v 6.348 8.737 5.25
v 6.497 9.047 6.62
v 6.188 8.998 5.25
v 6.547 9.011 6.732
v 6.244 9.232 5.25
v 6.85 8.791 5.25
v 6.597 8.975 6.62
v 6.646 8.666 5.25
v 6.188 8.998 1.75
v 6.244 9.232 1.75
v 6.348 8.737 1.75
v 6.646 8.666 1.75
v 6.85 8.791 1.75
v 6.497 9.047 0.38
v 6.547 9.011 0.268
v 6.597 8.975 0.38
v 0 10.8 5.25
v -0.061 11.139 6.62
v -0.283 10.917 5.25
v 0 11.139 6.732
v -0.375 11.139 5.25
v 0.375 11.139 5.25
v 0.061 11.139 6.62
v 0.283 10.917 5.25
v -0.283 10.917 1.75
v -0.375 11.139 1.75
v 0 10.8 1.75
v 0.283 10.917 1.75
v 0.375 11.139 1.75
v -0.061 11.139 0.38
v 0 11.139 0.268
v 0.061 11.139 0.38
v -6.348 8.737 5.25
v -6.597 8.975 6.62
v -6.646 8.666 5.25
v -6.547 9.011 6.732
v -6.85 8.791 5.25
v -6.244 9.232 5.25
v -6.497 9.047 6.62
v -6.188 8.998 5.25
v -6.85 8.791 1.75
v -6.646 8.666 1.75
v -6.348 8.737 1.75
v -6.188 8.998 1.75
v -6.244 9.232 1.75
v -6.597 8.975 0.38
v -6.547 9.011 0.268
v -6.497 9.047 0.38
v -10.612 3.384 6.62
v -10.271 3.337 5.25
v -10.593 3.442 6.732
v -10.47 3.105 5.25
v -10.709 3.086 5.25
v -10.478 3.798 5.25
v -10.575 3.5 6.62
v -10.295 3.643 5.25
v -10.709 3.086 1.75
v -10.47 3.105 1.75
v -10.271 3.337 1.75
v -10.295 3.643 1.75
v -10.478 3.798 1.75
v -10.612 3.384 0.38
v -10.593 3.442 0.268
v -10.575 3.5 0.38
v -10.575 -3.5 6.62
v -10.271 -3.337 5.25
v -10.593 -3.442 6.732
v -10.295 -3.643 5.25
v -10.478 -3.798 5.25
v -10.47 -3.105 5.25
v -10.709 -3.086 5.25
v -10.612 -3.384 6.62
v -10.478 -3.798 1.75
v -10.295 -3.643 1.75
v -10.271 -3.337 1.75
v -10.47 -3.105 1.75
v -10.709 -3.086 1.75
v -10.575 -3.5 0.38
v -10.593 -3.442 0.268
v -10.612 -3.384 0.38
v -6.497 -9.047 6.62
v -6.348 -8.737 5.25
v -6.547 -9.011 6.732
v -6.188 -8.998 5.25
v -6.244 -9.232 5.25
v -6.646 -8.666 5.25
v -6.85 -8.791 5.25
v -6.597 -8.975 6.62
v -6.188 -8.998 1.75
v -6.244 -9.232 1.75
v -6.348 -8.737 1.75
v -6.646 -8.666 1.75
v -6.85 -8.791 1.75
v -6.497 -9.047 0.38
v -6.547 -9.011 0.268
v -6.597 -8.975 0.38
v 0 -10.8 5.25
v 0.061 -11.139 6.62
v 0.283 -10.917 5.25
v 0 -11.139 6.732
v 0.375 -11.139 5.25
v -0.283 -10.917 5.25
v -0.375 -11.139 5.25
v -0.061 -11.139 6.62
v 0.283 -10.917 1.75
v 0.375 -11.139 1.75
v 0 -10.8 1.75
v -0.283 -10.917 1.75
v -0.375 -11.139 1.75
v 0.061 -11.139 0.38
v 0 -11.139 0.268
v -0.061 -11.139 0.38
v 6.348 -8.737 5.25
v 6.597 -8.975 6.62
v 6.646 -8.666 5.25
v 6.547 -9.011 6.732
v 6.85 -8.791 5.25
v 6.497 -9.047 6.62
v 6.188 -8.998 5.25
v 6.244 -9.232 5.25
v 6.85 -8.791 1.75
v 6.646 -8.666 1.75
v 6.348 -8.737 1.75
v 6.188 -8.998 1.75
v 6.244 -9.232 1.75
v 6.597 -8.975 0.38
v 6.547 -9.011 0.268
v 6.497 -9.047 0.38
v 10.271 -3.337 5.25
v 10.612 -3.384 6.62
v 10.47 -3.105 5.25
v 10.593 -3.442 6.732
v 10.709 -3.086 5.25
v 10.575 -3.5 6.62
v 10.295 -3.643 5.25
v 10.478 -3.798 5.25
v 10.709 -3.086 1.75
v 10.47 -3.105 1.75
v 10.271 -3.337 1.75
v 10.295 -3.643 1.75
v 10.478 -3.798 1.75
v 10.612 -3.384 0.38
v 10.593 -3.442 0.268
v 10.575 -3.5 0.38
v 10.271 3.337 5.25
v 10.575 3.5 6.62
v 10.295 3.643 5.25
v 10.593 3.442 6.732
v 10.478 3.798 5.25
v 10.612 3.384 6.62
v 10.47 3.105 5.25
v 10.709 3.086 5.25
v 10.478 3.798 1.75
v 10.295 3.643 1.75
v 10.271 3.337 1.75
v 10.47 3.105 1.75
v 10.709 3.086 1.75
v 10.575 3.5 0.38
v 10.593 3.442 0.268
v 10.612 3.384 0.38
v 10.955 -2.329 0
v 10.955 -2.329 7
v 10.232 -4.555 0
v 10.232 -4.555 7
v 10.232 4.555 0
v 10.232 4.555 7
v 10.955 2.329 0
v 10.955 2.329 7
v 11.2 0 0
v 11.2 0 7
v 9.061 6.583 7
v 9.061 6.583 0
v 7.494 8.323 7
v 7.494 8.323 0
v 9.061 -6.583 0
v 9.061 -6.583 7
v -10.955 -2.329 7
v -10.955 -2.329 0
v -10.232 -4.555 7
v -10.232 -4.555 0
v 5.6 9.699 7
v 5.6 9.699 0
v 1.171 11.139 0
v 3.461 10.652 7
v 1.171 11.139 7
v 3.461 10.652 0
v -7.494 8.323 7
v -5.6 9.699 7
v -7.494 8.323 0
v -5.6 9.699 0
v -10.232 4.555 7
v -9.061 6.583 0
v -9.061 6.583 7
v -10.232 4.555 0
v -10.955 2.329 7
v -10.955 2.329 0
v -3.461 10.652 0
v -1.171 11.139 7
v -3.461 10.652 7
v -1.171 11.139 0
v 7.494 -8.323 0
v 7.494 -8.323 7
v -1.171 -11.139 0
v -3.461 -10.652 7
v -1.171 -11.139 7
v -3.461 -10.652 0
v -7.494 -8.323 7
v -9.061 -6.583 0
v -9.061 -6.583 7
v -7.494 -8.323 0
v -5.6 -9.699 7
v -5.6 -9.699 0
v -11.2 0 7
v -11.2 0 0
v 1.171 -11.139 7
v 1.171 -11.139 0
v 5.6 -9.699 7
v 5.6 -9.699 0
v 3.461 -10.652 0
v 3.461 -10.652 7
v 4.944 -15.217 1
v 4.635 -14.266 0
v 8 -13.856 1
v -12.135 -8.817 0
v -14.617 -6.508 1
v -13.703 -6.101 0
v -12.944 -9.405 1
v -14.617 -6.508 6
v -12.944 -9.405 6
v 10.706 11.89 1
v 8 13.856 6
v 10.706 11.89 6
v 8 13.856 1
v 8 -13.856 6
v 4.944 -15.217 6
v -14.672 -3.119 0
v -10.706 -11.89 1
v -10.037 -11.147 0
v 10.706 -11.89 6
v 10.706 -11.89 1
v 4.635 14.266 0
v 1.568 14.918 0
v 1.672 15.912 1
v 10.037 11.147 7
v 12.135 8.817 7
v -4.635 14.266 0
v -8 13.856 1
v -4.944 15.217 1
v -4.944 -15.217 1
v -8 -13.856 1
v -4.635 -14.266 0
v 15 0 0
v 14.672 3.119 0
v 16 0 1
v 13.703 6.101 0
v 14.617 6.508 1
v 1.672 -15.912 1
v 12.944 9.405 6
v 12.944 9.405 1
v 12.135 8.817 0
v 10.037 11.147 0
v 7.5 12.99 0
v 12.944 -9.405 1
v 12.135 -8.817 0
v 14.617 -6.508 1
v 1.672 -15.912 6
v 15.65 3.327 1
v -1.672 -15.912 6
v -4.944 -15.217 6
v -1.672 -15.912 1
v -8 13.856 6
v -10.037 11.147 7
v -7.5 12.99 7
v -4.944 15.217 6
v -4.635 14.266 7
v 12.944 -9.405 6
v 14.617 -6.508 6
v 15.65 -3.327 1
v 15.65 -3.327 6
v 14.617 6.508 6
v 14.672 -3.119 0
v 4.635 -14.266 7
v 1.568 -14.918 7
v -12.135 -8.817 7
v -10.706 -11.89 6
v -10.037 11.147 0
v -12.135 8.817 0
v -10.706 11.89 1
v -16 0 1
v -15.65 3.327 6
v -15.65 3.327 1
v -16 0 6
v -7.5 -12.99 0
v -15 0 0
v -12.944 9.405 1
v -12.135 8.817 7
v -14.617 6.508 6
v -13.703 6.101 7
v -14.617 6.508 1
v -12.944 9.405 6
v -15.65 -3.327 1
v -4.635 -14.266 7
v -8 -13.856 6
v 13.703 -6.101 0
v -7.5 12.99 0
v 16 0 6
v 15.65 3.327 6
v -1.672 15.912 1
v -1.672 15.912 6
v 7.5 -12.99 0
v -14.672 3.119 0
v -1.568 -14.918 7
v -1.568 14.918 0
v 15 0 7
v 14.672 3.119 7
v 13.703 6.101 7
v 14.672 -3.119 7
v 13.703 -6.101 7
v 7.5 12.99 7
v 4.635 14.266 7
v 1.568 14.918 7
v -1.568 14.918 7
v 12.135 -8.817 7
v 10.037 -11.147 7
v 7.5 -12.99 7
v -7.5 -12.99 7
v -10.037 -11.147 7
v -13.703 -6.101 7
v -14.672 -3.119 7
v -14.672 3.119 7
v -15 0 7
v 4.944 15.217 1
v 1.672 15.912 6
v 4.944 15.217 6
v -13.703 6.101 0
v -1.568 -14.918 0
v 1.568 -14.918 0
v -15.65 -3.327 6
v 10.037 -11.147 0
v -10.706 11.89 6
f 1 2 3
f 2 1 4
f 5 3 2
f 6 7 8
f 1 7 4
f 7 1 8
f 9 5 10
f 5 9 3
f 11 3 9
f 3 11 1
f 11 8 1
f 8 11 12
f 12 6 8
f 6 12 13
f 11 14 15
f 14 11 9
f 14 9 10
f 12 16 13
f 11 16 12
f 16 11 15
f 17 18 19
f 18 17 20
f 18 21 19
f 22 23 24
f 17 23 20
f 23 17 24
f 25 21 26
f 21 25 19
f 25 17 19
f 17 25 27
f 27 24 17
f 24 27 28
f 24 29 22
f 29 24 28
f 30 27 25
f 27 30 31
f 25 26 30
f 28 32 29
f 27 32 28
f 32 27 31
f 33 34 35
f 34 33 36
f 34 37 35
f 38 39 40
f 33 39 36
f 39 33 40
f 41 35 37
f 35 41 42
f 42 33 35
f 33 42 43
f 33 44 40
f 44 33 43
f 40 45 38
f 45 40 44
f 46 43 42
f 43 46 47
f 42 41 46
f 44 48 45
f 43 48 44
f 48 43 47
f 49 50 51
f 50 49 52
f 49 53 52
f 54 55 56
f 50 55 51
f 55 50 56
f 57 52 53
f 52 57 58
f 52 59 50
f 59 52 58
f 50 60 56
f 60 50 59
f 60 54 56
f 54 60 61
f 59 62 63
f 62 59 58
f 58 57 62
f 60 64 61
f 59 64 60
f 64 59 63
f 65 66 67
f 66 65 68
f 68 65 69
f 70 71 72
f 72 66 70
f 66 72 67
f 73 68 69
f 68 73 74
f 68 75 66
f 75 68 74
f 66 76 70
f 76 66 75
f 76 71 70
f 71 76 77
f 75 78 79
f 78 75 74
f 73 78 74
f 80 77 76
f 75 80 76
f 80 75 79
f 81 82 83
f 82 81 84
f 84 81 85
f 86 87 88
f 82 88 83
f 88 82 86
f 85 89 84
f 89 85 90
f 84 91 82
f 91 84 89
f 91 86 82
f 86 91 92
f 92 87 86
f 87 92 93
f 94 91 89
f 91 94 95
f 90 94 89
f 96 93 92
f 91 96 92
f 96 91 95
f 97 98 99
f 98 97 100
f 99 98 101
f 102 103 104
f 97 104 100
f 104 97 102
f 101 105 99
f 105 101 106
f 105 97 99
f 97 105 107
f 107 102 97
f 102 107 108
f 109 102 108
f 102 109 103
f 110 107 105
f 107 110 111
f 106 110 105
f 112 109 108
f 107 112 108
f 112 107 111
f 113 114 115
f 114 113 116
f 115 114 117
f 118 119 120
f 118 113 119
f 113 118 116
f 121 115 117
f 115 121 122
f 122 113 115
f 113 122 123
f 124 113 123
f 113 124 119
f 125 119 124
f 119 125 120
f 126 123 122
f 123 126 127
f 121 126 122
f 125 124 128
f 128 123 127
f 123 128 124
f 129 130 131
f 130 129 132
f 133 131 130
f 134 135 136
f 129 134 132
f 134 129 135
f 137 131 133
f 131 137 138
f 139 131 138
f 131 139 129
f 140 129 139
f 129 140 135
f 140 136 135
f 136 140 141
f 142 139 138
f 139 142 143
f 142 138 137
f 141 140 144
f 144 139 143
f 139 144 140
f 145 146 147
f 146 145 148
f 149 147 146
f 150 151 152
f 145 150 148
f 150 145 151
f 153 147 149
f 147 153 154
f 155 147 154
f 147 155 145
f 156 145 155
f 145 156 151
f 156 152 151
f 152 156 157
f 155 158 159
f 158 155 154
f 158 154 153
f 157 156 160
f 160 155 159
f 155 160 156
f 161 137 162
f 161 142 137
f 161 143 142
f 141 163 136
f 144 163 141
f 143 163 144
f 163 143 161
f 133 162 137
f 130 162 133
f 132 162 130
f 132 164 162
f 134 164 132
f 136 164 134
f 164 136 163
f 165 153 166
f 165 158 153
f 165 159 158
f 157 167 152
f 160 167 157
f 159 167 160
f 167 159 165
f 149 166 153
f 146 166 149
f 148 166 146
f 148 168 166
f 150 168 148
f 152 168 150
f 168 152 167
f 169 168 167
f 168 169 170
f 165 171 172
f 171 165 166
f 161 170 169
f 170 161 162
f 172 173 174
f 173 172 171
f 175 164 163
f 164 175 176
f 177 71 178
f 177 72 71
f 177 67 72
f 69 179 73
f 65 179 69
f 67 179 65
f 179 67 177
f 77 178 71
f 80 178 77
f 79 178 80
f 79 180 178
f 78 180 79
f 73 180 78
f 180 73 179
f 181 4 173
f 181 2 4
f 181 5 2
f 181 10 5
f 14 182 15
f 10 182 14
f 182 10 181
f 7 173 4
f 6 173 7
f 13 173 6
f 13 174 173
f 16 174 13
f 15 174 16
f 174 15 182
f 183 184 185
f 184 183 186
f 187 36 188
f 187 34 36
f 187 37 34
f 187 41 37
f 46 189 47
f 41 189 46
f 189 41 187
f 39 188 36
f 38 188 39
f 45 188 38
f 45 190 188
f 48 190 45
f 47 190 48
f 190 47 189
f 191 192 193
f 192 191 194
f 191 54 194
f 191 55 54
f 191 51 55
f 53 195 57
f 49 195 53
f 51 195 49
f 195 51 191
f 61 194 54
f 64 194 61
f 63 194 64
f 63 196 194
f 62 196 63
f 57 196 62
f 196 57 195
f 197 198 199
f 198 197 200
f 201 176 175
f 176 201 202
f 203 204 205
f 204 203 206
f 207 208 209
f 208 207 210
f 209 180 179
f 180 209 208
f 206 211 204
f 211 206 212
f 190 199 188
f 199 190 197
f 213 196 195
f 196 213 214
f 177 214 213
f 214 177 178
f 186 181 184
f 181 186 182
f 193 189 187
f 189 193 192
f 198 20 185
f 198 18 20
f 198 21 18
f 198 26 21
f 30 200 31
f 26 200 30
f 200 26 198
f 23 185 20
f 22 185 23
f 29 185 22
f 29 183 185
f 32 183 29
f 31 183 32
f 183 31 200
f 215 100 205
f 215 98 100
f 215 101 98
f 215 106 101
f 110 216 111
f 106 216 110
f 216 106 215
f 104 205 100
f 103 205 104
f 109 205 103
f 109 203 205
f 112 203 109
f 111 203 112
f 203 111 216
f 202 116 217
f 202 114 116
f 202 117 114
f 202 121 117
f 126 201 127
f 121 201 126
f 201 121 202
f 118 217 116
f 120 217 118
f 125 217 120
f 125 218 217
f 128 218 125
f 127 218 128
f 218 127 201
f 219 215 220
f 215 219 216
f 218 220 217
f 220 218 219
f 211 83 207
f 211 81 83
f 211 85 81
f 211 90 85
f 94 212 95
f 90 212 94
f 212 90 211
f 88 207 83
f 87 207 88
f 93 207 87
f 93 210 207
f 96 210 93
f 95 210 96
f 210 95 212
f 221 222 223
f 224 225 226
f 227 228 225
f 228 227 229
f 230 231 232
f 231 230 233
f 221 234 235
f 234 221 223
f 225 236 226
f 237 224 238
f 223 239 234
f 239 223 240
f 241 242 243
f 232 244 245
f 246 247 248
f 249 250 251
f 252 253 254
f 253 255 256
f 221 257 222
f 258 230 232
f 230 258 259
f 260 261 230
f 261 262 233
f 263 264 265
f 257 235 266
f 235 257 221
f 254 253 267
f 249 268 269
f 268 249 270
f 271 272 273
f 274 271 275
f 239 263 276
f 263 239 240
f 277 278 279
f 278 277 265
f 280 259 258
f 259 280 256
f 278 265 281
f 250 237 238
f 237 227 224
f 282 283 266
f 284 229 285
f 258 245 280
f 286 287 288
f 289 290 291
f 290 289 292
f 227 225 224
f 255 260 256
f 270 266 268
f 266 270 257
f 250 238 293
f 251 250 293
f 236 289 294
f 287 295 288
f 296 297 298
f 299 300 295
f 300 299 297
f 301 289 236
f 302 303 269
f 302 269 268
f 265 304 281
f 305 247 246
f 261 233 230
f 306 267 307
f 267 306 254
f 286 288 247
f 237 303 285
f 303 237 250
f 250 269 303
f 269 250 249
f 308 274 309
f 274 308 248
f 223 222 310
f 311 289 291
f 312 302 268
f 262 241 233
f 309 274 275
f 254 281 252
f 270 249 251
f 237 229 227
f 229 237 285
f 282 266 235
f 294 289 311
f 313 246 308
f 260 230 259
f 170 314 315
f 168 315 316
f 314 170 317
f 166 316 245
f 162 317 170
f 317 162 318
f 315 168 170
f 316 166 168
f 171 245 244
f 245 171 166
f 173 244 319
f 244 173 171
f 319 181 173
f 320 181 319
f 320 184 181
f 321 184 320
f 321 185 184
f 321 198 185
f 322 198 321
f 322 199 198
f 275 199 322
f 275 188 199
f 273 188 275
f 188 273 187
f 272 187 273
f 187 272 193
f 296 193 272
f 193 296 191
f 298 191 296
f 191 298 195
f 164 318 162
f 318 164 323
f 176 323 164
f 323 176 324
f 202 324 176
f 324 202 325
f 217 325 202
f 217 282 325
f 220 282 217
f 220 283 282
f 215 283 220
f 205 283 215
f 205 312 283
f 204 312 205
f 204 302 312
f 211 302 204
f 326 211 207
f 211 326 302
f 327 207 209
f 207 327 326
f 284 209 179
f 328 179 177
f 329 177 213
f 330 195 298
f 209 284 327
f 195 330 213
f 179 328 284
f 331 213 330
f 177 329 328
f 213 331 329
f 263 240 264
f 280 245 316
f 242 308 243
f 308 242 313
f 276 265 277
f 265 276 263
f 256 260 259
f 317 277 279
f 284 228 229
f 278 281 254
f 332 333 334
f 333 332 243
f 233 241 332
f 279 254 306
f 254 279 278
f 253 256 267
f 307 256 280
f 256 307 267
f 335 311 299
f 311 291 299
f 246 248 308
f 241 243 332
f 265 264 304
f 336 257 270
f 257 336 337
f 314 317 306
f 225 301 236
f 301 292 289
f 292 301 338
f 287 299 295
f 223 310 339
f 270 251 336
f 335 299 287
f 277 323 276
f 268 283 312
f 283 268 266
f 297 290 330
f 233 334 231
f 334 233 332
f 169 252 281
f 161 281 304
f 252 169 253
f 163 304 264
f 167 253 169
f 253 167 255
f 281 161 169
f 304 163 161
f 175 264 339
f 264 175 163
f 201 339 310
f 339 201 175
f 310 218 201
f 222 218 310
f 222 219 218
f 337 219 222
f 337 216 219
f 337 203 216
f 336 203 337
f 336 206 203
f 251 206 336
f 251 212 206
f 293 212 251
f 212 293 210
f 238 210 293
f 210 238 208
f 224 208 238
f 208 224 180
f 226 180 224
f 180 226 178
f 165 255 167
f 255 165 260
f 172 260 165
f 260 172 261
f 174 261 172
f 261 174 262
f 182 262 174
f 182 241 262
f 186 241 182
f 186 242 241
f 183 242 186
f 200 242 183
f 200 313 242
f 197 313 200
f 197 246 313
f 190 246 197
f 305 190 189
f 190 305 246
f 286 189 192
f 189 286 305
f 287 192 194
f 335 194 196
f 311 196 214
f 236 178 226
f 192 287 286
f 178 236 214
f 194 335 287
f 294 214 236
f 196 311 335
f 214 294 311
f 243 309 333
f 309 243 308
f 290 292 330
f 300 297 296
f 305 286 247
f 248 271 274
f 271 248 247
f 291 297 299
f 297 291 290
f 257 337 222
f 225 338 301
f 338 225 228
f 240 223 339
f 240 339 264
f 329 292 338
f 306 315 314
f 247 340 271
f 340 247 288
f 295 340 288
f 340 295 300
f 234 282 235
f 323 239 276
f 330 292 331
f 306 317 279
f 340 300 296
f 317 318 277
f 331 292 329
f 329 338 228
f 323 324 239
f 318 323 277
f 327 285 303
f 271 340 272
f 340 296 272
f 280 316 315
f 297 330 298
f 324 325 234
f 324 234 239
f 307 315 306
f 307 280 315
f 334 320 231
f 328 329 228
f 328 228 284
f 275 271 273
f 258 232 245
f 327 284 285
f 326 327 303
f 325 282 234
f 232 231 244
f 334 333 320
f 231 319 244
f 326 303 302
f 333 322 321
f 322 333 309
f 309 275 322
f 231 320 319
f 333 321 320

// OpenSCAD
// file: shapes/torus.scad
torus();

module torus(
    h = 2,     
    r = 10,   
    sides = $fn)
{
    tube_radius = h / 2;
    inside_radius = r - tube_radius;
    //translate([r,r,thickness_radius])
    translate([0,0,tube_radius])
    rotate_extrude()
    translate([inside_radius, 0, 0])
    circle(r = tube_radius, $fn = sides);
}
// file: shapes/bearing.table.scad
function bearing_outer_diameter(index) = bearing_data(index)[0];
function bearing_inner_diameter(index) = bearing_data(index)[1];
function bearing_height(index) = bearing_data(index)[2];
function bearing_ball_qty(index) = bearing_data(index)[3];

function bearing_data(index) = 
    // od, id, h, ball_qty
    index == "608"  ? [22, 8, 7, 7] :
    "Error";
// file: shapes/bearing_race_hole.settings.scad
default_clearance = 0.2;
default_spline_qty = 10;
default_spline_depth = 0.4;
default_extra_margin_top = 10;
default_extra_margin_bottom = 10;
// file: shapes/bearing_race_spline.scad
bearing_race_spline();

module bearing_race_spline(
    h = 10, 
    r = 1,
    taper = 2.5)
{
    cylinder_height = h - (taper * 2);
    
    translate([0,0,taper + cylinder_height])
    cylinder(h = taper, r1 = r, r2 = 0);
    
    translate([0,0,taper])
    cylinder(h = cylinder_height, r = r);
    
    cylinder(h = taper, r1 = 0, r2 = r);
}
// file: shapes/chamfer_cylinder.scad
use <torus.scad>;

default_chamfer_radius = 1;

chamfer_cylinder();

module chamfer_cylinder(
    h = 10, 
    r = undef,
    d = 10,
    chamfer_radius = undef)
{
    function _chamfer_radius() = (chamfer_radius != undef) ? chamfer_radius : default_chamfer_radius;
    
    function _r() = 
        (r) ? r : 
        (d) ? d / 2 :
        "error";

    hull()
    {
        r = _r();
        chamfer_radius = _chamfer_radius();

        // top chamfer
        translate([0, 0, h-chamfer_radius])
        cylinder(
            h = chamfer_radius, 
            r1 = r,
            r2 = r - chamfer_radius);
        
        // bottom chamfer
        cylinder(
            h = chamfer_radius, 
            r1 = r - chamfer_radius,
            r2 = r);
    }    
}
// file: shapes/bearing_race_hole.scad
use <bearing_race_spline.scad>;
include <bearing_race_hole.settings.scad>;
include <bearing.table.scad>;

bearing_race_hole();

module bearing_race_hole(
    index = "608",
    clearance = undef,
    h = undef,
    spline_qty = undef,
    spline_depth = undef,
    extra_margin_bottom = undef,
    extra_margin_top = undef)
{
    function _clearance() = (clearance != undef) ? clearance : default_clearance;
    function _h() = (h != undef) ? h : bearing_height(index);
    function _spline_qty() = (spline_qty != undef) ? spline_qty : default_spline_qty;
    function _spline_depth() = (spline_depth != undef) ? spline_depth : default_spline_depth;
    function _extra_margin_bottom() = (extra_margin_bottom != undef) ? extra_margin_bottom : default_extra_margin_bottom;
    function _extra_margin_top() = (extra_margin_top != undef) ? extra_margin_top : default_extra_margin_top;

    r = (bearing_outer_diameter(index) / 2) + _clearance();

    difference()
    {
        extra_margin_bottom = _extra_margin_bottom();
        extra_margin_top = _extra_margin_top();
        spline_qty = _spline_qty();
        h = _h() + extra_margin_bottom + extra_margin_top;

        translate([0, 0, -extra_margin_bottom])
        cylinder(h = h, r = r);
        
        rotate([0, 0, 360 / spline_qty / 2])
        splines();
    }
    
    module splines()
    {
        h = _h();
        spline_qty = _spline_qty();
        spline_depth = _spline_depth();

        for (i = [1:spline_qty])
        {
            angle = i * (360 / spline_qty);
            rotate([0, 0, angle])
            translate([r, 0, 0])
            bearing_race_spline(
                h = h, 
                r = spline_depth, 
                taper = h / 4, 
                $fn = 8);
        }        
    }
}
// main file
use <shapes/bearing_race_hole.scad>;
use <shapes/chamfer_cylinder.scad>;

build_bearing_fit_test();

module build_bearing_fit_test(
    index = "608"
)
{
    difference()
    {
        d = bearing_outer_diameter(index) + 10;
        h = bearing_height(index);

        chamfer_cylinder(d = d, h = h);
        bearing_race_hole(index, h = h);
    }
}
